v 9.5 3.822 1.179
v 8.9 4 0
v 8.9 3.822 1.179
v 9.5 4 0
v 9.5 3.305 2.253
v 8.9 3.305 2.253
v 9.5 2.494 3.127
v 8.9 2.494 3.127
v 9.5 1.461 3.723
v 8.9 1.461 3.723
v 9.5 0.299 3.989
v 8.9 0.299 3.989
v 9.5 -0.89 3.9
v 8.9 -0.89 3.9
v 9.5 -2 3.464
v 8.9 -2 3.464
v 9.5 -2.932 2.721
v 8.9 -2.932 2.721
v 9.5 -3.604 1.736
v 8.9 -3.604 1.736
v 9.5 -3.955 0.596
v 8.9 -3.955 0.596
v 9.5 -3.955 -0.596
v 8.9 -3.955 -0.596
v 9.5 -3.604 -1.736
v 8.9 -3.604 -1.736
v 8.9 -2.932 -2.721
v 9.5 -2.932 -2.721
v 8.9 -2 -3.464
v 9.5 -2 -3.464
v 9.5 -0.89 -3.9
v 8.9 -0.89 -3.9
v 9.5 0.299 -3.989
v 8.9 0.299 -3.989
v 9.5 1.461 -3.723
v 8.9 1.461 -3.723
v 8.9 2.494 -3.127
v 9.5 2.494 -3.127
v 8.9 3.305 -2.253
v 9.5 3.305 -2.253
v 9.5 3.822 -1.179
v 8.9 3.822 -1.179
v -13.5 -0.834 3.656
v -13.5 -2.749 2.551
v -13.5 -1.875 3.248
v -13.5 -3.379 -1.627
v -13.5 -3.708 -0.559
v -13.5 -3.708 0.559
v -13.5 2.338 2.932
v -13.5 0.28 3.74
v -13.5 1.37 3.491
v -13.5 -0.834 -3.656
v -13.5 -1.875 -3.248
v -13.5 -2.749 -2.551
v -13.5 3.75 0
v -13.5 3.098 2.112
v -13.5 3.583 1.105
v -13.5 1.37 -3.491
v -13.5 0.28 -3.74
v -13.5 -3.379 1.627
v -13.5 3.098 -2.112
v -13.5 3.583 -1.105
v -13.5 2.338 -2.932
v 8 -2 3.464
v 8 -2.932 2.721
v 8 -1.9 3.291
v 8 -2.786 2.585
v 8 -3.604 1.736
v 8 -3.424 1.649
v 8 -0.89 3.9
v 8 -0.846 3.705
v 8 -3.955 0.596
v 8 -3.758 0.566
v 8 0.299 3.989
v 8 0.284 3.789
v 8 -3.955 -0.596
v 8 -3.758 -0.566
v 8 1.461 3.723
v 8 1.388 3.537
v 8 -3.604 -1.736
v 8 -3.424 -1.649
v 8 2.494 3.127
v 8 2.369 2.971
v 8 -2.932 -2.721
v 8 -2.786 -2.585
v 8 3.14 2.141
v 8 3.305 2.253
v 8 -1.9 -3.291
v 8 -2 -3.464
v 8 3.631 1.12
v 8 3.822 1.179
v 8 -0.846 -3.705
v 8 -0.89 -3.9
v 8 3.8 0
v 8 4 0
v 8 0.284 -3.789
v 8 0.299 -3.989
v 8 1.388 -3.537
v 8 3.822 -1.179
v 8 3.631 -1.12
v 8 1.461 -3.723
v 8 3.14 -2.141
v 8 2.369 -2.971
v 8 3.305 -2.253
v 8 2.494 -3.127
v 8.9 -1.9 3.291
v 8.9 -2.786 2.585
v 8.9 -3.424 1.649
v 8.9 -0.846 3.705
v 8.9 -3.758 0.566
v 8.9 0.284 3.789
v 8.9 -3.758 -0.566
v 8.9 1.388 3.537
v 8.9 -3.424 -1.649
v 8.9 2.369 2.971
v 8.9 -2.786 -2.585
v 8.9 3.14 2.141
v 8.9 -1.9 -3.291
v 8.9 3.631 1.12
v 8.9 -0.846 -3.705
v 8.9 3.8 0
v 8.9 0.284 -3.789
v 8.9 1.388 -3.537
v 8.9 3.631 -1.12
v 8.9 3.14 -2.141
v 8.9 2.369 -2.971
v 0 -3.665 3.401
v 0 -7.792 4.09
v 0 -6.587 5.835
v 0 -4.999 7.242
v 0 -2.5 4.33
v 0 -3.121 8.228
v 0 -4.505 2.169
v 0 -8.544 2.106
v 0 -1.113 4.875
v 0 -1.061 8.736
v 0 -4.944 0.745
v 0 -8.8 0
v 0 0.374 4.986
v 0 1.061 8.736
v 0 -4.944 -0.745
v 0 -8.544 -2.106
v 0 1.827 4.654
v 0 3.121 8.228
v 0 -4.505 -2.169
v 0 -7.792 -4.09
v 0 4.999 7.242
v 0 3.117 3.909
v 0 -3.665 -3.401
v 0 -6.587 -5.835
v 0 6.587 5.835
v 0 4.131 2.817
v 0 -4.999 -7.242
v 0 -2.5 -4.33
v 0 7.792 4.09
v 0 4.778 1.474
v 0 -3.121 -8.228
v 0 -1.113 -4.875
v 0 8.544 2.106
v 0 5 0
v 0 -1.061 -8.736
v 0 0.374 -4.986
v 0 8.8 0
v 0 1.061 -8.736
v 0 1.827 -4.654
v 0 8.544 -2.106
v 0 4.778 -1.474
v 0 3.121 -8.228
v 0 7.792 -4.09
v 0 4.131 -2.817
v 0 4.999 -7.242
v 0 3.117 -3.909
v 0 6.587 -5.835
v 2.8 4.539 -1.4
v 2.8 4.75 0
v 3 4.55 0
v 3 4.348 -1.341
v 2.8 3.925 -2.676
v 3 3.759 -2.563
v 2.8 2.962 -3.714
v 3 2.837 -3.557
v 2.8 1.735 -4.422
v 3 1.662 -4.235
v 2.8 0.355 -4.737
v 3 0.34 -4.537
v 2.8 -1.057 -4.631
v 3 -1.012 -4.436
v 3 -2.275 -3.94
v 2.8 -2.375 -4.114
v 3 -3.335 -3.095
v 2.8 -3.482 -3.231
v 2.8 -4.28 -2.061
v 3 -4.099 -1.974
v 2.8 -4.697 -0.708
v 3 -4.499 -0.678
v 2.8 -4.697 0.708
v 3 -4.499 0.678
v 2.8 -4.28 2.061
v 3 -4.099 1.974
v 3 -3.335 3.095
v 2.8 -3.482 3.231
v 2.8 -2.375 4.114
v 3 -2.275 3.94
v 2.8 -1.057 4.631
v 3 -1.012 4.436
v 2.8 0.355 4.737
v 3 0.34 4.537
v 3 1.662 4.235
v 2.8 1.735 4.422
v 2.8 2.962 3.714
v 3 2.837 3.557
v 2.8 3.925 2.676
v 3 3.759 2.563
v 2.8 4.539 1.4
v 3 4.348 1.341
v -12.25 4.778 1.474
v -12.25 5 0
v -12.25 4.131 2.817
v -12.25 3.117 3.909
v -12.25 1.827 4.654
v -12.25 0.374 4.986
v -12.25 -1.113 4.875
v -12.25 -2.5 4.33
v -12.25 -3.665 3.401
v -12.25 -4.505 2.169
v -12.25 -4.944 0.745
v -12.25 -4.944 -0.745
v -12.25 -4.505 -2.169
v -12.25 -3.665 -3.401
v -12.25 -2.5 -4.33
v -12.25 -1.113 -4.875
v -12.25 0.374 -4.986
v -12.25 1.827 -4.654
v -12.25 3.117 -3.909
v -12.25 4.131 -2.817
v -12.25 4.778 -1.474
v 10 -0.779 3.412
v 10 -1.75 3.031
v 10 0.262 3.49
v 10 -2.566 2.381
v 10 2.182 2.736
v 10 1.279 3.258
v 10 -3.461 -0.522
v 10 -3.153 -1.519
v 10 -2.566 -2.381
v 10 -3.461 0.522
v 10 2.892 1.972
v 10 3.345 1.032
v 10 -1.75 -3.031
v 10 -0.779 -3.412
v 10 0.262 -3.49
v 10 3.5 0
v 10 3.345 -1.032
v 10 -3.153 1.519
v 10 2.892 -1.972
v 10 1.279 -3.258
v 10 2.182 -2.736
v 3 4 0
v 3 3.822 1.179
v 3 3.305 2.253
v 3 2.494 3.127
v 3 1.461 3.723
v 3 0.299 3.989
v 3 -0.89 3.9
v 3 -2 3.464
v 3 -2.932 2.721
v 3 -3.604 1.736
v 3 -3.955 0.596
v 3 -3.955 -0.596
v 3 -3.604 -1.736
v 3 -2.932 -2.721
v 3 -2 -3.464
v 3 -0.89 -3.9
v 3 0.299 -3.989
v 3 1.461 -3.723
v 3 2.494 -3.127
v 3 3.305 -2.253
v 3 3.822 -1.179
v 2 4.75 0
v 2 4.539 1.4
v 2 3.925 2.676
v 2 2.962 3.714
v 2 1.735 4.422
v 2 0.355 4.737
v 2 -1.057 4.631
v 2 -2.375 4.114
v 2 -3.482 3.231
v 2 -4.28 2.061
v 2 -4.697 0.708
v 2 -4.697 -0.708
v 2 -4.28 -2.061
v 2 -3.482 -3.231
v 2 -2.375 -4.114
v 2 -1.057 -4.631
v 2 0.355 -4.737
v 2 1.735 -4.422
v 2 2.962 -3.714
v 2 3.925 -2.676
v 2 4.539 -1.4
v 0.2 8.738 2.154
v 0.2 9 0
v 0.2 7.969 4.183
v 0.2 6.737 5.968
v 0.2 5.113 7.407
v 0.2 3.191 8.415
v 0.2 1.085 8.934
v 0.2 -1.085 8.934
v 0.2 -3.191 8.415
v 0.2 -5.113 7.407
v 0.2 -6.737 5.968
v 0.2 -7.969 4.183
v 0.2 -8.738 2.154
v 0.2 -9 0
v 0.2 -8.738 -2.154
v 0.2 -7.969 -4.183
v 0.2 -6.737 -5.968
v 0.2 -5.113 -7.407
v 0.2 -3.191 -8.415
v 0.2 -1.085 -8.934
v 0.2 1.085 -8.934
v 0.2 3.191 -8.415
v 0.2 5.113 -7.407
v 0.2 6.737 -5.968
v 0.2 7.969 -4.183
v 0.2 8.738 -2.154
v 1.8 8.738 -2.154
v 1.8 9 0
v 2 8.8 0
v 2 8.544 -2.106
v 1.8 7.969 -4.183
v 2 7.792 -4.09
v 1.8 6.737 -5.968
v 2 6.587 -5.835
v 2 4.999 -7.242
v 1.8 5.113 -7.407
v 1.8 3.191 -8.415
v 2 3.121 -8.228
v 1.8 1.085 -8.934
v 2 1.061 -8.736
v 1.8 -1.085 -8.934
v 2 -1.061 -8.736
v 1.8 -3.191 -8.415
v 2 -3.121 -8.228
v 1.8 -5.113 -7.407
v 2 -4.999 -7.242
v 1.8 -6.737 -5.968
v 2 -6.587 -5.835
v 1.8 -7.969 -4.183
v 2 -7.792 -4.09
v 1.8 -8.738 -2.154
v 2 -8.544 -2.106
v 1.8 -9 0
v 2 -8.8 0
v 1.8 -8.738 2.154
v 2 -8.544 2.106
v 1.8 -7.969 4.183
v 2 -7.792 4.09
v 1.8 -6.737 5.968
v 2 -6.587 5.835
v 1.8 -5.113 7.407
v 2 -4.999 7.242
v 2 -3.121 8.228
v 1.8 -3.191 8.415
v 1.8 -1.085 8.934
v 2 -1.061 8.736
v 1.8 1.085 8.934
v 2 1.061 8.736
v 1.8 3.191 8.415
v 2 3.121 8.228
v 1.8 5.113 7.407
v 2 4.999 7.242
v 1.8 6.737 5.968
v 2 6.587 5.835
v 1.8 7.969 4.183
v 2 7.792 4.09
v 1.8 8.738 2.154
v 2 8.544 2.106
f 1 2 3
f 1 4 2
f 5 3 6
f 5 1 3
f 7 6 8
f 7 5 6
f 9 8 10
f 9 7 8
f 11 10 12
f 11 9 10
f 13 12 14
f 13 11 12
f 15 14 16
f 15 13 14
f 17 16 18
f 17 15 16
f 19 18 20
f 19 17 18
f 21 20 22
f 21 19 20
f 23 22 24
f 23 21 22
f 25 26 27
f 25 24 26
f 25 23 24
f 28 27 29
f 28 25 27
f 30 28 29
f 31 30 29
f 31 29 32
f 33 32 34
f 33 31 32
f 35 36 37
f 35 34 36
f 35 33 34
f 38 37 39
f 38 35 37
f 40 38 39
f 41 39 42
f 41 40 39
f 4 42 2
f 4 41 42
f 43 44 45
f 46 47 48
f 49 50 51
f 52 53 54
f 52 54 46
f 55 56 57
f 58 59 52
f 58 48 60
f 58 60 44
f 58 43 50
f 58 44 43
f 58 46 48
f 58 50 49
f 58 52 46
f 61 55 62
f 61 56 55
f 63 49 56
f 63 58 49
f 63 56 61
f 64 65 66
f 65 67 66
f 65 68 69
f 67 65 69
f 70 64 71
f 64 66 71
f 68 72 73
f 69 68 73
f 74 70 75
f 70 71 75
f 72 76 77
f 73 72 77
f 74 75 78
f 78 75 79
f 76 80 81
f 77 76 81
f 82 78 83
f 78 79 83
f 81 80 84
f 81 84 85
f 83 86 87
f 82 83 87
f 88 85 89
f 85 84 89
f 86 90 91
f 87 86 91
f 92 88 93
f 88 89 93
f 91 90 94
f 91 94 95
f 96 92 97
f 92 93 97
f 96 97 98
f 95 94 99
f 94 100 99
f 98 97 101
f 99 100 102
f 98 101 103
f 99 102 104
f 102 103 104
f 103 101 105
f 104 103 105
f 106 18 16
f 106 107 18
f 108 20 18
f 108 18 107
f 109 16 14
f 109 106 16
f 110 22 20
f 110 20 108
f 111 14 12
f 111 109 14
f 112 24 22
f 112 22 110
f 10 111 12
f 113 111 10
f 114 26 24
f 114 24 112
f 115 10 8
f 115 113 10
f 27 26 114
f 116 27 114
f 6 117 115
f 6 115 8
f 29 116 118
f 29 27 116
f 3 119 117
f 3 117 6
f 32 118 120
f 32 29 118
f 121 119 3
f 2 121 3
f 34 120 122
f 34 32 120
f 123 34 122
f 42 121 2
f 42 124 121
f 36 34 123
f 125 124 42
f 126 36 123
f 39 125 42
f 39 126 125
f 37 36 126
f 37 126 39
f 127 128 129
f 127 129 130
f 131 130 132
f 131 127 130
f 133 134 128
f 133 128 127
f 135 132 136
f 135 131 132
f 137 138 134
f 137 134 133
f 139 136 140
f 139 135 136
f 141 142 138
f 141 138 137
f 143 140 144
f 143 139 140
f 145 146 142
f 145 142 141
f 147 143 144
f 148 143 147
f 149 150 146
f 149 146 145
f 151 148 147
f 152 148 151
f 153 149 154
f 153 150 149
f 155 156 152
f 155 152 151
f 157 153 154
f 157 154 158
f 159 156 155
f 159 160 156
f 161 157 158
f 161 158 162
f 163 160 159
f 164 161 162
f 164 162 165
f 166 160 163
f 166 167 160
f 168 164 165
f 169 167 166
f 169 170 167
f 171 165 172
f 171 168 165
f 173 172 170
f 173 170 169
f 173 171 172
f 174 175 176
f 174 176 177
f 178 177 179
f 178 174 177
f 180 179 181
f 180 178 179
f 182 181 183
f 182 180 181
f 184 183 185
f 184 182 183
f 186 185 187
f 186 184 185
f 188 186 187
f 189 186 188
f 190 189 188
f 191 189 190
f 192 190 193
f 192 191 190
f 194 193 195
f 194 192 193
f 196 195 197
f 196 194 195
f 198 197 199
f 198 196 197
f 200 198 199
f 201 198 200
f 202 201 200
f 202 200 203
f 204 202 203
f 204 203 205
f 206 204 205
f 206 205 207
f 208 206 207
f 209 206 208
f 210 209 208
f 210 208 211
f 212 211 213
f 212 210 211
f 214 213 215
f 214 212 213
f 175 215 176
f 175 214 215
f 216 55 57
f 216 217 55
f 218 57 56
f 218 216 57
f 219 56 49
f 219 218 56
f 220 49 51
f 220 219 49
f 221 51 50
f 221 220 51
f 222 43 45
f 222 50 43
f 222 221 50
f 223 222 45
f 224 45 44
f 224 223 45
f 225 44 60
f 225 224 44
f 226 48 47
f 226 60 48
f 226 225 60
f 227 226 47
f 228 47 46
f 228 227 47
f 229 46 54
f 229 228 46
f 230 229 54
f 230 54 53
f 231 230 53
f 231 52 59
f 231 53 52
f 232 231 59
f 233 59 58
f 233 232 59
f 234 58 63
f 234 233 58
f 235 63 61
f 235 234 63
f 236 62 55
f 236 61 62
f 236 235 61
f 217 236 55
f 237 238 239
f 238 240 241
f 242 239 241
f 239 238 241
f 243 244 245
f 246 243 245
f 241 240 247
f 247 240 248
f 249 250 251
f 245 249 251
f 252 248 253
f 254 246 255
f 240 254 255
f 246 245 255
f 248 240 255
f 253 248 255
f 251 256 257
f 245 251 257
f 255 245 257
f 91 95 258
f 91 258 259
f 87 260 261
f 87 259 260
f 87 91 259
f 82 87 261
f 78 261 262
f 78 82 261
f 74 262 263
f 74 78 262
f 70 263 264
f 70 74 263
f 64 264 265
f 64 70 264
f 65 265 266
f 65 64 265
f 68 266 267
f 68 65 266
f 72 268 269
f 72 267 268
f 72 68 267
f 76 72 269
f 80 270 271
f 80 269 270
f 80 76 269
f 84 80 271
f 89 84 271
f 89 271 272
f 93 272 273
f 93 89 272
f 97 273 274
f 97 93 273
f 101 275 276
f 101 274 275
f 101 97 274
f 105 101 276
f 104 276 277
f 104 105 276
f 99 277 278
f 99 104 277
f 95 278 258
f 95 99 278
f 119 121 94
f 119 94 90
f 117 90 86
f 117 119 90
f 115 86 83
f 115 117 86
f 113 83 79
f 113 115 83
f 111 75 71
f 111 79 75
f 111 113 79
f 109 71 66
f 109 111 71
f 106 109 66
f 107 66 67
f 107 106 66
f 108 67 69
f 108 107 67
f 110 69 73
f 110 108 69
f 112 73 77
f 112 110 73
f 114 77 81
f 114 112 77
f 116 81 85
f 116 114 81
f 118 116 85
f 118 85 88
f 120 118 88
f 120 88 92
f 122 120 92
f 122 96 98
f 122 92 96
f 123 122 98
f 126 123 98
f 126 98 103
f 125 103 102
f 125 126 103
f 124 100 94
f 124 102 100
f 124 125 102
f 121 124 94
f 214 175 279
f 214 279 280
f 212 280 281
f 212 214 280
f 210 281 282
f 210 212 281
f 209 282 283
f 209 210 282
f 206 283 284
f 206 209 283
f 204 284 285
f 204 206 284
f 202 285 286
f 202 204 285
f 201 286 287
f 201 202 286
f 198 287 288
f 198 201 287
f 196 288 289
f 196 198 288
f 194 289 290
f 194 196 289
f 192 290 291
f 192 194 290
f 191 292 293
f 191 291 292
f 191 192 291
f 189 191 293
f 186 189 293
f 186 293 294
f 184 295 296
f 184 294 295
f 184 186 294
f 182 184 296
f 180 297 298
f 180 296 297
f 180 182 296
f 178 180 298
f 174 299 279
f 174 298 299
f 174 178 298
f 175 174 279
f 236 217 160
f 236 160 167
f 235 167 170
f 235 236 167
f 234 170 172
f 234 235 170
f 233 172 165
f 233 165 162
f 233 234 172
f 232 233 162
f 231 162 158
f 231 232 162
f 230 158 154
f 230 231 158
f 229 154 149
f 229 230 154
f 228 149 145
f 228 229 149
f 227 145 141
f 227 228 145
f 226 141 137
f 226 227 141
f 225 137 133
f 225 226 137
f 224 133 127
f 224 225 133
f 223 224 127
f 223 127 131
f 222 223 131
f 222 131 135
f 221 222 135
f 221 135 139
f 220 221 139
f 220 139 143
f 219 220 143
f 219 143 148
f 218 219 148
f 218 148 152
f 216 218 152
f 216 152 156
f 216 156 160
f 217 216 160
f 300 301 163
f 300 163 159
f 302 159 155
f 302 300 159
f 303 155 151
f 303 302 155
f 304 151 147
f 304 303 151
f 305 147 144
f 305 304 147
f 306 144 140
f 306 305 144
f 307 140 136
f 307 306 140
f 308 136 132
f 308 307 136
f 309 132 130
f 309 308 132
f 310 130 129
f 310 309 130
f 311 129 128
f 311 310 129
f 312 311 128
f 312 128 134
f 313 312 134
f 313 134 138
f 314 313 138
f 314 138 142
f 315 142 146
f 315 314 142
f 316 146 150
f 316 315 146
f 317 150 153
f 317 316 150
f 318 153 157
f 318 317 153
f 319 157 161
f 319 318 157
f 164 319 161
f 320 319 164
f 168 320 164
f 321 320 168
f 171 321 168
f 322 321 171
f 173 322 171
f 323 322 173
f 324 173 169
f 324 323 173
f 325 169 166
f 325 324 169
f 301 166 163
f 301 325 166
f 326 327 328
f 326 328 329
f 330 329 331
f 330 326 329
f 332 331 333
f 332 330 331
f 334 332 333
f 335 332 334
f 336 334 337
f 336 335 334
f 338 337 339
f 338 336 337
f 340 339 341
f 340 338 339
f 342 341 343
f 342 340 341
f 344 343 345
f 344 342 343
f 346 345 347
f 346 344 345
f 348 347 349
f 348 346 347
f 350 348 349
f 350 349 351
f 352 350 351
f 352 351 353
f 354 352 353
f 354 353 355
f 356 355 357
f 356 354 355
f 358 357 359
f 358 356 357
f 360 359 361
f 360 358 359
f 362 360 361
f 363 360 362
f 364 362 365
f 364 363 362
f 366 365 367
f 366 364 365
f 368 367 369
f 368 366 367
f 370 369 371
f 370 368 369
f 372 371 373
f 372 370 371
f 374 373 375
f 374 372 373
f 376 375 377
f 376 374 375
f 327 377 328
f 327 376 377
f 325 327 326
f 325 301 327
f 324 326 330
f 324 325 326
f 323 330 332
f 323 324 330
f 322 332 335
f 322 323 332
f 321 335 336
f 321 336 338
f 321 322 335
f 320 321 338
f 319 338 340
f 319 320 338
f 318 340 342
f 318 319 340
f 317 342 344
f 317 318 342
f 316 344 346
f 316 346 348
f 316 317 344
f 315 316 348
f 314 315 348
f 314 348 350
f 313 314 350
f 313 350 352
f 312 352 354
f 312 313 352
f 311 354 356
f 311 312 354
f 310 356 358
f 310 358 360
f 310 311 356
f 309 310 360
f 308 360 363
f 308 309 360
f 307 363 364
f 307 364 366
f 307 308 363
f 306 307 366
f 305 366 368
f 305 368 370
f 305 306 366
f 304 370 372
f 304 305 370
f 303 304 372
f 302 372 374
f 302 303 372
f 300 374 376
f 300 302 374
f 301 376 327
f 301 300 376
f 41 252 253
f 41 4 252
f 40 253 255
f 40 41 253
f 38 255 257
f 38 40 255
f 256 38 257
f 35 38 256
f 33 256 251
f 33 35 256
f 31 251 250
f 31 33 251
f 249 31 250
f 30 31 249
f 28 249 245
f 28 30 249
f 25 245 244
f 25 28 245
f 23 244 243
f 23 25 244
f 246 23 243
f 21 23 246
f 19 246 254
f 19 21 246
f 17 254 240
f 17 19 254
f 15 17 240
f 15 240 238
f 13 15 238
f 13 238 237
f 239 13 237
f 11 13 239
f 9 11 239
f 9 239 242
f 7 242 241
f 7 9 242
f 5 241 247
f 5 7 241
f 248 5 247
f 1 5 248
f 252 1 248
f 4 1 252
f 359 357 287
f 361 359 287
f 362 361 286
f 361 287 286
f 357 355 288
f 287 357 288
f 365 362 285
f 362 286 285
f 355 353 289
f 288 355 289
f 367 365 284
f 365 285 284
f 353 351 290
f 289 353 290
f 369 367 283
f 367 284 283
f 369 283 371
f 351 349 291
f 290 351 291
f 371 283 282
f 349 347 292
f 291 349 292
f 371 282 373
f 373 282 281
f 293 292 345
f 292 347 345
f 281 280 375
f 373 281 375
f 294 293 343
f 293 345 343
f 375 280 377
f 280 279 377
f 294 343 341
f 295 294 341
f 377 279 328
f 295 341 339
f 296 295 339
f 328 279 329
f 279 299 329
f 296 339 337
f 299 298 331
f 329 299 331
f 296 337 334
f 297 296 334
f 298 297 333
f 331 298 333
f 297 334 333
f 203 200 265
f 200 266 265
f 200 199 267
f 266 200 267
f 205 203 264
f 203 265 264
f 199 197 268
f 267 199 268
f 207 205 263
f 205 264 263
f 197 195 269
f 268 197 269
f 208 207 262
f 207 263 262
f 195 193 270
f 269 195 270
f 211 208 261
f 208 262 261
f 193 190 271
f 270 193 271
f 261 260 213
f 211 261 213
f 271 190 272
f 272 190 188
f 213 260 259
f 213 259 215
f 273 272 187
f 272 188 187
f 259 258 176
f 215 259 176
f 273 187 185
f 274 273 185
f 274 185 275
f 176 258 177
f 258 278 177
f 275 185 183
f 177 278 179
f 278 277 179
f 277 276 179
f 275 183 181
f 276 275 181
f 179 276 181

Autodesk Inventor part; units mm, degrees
ref_plane "YZ Plane" through (0, 0, 0) normal (1, 0, 0) x (0, 1, 0)
ref_plane "XZ Plane" through (0, 0, 0) normal (0, 1, 0) x (-1, 0, 0)
ref_plane "XY Plane" through (0, 0, 0) normal (0, 0, 1) x (1, 0, 0)
sketch "Skizze1" plane through (0, 0, 0) normal (0, 0, 1) x (1, 0, 0)
  line L0 (0, 0) -> (0, 4.75)
  line L1 (0, 4.75) -> (3, 4.75)
  line L2 (3, 4.75) -> (3, 4)
  line L3 (3, 4) -> (8, 4)
  line L4 (8, 4) -> (8, 3.8)
  line L5 (8, 3.8) -> (8.9, 3.8)
  line L6 (8.9, 3.8) -> (8.9, 4)
  line L7 (8.9, 4) -> (9.5, 4)
  line L8 (10, 3.5) -> (10, 0)
  line L9 (10, 0) -> (0, 0)
  line L10 (0, 5) -> (-12.25, 5)
  line L11 (-13.5, 3.75) -> (-13.5, 0)
  line L12 (-13.5, 0) -> (0, 0)
  line L13 (9.5, 4) -> (10, 3.5)
  line L14 (-13.5, 3.75) -> (-12.25, 5)
  line L15 (8, 4) -> (8, 0) construction
  line L16 (2, 4.75) -> (2, 9)
  line L17 (2, 9) -> (0, 9)
  line L18 (0, 9) -> (0, 4.75)
  line L19 (3, 4) -> (3, 0) construction
  point P0 (10, 4)
  point P1 (-13.5, 5)
  dimension "d0" = 7.6
  dimension "d1" = 0.5
  dimension "d2" = 0.5
  dimension "d3" = 0.9
  dimension "d4" = 8
  dimension "d5" = 0.6
  dimension "d6" = 9.5
  dimension "d8" = 10
  dimension "d9" = 1.25
  dimension "d10" = 1.25
  dimension "d11" = 13.5
  dimension "d15" = 0
  dimension "d22" = 1
  dimension "d23" = 18
  dimension "d24" = 5
  dimension "d25" = 0
  dimension "d27" = 3
revolve "Umdrehung1" add sketch "Skizze1" angle 360 about axis through (10, 0, 0) along (-1, 0, 0)
thread "Gewinde1" size "M10x1.5" class "6g" standard "ANSI Metric M Profile" full length
chamfer "Fase1" distance 0.2 angle 45 3 edges at (3, -4.75, 0) (2, -9, 0) (0, -9, 0)
equation "\"d2\" = d1"
equation "\"d10\" = d9"
equation "\"d22\" = JTM_1018_Thickness"
equation "\"d24\" = Bearing_Thickness"
equation "\"Bearing_StepThickness\" = 2"
equation "\"SupportLink_Bearing_StepDia\" = 13"
equation "\"Bearing_Thickness\" = 5"
equation "\"Bearing_Flansch_Thickness\" = 1.1"
equation "\"JTM_1018_Thickness\" = 1"
properties part number "ParallelMech_SupportLink_Distall_JointShaft" material "Edelstahl"
